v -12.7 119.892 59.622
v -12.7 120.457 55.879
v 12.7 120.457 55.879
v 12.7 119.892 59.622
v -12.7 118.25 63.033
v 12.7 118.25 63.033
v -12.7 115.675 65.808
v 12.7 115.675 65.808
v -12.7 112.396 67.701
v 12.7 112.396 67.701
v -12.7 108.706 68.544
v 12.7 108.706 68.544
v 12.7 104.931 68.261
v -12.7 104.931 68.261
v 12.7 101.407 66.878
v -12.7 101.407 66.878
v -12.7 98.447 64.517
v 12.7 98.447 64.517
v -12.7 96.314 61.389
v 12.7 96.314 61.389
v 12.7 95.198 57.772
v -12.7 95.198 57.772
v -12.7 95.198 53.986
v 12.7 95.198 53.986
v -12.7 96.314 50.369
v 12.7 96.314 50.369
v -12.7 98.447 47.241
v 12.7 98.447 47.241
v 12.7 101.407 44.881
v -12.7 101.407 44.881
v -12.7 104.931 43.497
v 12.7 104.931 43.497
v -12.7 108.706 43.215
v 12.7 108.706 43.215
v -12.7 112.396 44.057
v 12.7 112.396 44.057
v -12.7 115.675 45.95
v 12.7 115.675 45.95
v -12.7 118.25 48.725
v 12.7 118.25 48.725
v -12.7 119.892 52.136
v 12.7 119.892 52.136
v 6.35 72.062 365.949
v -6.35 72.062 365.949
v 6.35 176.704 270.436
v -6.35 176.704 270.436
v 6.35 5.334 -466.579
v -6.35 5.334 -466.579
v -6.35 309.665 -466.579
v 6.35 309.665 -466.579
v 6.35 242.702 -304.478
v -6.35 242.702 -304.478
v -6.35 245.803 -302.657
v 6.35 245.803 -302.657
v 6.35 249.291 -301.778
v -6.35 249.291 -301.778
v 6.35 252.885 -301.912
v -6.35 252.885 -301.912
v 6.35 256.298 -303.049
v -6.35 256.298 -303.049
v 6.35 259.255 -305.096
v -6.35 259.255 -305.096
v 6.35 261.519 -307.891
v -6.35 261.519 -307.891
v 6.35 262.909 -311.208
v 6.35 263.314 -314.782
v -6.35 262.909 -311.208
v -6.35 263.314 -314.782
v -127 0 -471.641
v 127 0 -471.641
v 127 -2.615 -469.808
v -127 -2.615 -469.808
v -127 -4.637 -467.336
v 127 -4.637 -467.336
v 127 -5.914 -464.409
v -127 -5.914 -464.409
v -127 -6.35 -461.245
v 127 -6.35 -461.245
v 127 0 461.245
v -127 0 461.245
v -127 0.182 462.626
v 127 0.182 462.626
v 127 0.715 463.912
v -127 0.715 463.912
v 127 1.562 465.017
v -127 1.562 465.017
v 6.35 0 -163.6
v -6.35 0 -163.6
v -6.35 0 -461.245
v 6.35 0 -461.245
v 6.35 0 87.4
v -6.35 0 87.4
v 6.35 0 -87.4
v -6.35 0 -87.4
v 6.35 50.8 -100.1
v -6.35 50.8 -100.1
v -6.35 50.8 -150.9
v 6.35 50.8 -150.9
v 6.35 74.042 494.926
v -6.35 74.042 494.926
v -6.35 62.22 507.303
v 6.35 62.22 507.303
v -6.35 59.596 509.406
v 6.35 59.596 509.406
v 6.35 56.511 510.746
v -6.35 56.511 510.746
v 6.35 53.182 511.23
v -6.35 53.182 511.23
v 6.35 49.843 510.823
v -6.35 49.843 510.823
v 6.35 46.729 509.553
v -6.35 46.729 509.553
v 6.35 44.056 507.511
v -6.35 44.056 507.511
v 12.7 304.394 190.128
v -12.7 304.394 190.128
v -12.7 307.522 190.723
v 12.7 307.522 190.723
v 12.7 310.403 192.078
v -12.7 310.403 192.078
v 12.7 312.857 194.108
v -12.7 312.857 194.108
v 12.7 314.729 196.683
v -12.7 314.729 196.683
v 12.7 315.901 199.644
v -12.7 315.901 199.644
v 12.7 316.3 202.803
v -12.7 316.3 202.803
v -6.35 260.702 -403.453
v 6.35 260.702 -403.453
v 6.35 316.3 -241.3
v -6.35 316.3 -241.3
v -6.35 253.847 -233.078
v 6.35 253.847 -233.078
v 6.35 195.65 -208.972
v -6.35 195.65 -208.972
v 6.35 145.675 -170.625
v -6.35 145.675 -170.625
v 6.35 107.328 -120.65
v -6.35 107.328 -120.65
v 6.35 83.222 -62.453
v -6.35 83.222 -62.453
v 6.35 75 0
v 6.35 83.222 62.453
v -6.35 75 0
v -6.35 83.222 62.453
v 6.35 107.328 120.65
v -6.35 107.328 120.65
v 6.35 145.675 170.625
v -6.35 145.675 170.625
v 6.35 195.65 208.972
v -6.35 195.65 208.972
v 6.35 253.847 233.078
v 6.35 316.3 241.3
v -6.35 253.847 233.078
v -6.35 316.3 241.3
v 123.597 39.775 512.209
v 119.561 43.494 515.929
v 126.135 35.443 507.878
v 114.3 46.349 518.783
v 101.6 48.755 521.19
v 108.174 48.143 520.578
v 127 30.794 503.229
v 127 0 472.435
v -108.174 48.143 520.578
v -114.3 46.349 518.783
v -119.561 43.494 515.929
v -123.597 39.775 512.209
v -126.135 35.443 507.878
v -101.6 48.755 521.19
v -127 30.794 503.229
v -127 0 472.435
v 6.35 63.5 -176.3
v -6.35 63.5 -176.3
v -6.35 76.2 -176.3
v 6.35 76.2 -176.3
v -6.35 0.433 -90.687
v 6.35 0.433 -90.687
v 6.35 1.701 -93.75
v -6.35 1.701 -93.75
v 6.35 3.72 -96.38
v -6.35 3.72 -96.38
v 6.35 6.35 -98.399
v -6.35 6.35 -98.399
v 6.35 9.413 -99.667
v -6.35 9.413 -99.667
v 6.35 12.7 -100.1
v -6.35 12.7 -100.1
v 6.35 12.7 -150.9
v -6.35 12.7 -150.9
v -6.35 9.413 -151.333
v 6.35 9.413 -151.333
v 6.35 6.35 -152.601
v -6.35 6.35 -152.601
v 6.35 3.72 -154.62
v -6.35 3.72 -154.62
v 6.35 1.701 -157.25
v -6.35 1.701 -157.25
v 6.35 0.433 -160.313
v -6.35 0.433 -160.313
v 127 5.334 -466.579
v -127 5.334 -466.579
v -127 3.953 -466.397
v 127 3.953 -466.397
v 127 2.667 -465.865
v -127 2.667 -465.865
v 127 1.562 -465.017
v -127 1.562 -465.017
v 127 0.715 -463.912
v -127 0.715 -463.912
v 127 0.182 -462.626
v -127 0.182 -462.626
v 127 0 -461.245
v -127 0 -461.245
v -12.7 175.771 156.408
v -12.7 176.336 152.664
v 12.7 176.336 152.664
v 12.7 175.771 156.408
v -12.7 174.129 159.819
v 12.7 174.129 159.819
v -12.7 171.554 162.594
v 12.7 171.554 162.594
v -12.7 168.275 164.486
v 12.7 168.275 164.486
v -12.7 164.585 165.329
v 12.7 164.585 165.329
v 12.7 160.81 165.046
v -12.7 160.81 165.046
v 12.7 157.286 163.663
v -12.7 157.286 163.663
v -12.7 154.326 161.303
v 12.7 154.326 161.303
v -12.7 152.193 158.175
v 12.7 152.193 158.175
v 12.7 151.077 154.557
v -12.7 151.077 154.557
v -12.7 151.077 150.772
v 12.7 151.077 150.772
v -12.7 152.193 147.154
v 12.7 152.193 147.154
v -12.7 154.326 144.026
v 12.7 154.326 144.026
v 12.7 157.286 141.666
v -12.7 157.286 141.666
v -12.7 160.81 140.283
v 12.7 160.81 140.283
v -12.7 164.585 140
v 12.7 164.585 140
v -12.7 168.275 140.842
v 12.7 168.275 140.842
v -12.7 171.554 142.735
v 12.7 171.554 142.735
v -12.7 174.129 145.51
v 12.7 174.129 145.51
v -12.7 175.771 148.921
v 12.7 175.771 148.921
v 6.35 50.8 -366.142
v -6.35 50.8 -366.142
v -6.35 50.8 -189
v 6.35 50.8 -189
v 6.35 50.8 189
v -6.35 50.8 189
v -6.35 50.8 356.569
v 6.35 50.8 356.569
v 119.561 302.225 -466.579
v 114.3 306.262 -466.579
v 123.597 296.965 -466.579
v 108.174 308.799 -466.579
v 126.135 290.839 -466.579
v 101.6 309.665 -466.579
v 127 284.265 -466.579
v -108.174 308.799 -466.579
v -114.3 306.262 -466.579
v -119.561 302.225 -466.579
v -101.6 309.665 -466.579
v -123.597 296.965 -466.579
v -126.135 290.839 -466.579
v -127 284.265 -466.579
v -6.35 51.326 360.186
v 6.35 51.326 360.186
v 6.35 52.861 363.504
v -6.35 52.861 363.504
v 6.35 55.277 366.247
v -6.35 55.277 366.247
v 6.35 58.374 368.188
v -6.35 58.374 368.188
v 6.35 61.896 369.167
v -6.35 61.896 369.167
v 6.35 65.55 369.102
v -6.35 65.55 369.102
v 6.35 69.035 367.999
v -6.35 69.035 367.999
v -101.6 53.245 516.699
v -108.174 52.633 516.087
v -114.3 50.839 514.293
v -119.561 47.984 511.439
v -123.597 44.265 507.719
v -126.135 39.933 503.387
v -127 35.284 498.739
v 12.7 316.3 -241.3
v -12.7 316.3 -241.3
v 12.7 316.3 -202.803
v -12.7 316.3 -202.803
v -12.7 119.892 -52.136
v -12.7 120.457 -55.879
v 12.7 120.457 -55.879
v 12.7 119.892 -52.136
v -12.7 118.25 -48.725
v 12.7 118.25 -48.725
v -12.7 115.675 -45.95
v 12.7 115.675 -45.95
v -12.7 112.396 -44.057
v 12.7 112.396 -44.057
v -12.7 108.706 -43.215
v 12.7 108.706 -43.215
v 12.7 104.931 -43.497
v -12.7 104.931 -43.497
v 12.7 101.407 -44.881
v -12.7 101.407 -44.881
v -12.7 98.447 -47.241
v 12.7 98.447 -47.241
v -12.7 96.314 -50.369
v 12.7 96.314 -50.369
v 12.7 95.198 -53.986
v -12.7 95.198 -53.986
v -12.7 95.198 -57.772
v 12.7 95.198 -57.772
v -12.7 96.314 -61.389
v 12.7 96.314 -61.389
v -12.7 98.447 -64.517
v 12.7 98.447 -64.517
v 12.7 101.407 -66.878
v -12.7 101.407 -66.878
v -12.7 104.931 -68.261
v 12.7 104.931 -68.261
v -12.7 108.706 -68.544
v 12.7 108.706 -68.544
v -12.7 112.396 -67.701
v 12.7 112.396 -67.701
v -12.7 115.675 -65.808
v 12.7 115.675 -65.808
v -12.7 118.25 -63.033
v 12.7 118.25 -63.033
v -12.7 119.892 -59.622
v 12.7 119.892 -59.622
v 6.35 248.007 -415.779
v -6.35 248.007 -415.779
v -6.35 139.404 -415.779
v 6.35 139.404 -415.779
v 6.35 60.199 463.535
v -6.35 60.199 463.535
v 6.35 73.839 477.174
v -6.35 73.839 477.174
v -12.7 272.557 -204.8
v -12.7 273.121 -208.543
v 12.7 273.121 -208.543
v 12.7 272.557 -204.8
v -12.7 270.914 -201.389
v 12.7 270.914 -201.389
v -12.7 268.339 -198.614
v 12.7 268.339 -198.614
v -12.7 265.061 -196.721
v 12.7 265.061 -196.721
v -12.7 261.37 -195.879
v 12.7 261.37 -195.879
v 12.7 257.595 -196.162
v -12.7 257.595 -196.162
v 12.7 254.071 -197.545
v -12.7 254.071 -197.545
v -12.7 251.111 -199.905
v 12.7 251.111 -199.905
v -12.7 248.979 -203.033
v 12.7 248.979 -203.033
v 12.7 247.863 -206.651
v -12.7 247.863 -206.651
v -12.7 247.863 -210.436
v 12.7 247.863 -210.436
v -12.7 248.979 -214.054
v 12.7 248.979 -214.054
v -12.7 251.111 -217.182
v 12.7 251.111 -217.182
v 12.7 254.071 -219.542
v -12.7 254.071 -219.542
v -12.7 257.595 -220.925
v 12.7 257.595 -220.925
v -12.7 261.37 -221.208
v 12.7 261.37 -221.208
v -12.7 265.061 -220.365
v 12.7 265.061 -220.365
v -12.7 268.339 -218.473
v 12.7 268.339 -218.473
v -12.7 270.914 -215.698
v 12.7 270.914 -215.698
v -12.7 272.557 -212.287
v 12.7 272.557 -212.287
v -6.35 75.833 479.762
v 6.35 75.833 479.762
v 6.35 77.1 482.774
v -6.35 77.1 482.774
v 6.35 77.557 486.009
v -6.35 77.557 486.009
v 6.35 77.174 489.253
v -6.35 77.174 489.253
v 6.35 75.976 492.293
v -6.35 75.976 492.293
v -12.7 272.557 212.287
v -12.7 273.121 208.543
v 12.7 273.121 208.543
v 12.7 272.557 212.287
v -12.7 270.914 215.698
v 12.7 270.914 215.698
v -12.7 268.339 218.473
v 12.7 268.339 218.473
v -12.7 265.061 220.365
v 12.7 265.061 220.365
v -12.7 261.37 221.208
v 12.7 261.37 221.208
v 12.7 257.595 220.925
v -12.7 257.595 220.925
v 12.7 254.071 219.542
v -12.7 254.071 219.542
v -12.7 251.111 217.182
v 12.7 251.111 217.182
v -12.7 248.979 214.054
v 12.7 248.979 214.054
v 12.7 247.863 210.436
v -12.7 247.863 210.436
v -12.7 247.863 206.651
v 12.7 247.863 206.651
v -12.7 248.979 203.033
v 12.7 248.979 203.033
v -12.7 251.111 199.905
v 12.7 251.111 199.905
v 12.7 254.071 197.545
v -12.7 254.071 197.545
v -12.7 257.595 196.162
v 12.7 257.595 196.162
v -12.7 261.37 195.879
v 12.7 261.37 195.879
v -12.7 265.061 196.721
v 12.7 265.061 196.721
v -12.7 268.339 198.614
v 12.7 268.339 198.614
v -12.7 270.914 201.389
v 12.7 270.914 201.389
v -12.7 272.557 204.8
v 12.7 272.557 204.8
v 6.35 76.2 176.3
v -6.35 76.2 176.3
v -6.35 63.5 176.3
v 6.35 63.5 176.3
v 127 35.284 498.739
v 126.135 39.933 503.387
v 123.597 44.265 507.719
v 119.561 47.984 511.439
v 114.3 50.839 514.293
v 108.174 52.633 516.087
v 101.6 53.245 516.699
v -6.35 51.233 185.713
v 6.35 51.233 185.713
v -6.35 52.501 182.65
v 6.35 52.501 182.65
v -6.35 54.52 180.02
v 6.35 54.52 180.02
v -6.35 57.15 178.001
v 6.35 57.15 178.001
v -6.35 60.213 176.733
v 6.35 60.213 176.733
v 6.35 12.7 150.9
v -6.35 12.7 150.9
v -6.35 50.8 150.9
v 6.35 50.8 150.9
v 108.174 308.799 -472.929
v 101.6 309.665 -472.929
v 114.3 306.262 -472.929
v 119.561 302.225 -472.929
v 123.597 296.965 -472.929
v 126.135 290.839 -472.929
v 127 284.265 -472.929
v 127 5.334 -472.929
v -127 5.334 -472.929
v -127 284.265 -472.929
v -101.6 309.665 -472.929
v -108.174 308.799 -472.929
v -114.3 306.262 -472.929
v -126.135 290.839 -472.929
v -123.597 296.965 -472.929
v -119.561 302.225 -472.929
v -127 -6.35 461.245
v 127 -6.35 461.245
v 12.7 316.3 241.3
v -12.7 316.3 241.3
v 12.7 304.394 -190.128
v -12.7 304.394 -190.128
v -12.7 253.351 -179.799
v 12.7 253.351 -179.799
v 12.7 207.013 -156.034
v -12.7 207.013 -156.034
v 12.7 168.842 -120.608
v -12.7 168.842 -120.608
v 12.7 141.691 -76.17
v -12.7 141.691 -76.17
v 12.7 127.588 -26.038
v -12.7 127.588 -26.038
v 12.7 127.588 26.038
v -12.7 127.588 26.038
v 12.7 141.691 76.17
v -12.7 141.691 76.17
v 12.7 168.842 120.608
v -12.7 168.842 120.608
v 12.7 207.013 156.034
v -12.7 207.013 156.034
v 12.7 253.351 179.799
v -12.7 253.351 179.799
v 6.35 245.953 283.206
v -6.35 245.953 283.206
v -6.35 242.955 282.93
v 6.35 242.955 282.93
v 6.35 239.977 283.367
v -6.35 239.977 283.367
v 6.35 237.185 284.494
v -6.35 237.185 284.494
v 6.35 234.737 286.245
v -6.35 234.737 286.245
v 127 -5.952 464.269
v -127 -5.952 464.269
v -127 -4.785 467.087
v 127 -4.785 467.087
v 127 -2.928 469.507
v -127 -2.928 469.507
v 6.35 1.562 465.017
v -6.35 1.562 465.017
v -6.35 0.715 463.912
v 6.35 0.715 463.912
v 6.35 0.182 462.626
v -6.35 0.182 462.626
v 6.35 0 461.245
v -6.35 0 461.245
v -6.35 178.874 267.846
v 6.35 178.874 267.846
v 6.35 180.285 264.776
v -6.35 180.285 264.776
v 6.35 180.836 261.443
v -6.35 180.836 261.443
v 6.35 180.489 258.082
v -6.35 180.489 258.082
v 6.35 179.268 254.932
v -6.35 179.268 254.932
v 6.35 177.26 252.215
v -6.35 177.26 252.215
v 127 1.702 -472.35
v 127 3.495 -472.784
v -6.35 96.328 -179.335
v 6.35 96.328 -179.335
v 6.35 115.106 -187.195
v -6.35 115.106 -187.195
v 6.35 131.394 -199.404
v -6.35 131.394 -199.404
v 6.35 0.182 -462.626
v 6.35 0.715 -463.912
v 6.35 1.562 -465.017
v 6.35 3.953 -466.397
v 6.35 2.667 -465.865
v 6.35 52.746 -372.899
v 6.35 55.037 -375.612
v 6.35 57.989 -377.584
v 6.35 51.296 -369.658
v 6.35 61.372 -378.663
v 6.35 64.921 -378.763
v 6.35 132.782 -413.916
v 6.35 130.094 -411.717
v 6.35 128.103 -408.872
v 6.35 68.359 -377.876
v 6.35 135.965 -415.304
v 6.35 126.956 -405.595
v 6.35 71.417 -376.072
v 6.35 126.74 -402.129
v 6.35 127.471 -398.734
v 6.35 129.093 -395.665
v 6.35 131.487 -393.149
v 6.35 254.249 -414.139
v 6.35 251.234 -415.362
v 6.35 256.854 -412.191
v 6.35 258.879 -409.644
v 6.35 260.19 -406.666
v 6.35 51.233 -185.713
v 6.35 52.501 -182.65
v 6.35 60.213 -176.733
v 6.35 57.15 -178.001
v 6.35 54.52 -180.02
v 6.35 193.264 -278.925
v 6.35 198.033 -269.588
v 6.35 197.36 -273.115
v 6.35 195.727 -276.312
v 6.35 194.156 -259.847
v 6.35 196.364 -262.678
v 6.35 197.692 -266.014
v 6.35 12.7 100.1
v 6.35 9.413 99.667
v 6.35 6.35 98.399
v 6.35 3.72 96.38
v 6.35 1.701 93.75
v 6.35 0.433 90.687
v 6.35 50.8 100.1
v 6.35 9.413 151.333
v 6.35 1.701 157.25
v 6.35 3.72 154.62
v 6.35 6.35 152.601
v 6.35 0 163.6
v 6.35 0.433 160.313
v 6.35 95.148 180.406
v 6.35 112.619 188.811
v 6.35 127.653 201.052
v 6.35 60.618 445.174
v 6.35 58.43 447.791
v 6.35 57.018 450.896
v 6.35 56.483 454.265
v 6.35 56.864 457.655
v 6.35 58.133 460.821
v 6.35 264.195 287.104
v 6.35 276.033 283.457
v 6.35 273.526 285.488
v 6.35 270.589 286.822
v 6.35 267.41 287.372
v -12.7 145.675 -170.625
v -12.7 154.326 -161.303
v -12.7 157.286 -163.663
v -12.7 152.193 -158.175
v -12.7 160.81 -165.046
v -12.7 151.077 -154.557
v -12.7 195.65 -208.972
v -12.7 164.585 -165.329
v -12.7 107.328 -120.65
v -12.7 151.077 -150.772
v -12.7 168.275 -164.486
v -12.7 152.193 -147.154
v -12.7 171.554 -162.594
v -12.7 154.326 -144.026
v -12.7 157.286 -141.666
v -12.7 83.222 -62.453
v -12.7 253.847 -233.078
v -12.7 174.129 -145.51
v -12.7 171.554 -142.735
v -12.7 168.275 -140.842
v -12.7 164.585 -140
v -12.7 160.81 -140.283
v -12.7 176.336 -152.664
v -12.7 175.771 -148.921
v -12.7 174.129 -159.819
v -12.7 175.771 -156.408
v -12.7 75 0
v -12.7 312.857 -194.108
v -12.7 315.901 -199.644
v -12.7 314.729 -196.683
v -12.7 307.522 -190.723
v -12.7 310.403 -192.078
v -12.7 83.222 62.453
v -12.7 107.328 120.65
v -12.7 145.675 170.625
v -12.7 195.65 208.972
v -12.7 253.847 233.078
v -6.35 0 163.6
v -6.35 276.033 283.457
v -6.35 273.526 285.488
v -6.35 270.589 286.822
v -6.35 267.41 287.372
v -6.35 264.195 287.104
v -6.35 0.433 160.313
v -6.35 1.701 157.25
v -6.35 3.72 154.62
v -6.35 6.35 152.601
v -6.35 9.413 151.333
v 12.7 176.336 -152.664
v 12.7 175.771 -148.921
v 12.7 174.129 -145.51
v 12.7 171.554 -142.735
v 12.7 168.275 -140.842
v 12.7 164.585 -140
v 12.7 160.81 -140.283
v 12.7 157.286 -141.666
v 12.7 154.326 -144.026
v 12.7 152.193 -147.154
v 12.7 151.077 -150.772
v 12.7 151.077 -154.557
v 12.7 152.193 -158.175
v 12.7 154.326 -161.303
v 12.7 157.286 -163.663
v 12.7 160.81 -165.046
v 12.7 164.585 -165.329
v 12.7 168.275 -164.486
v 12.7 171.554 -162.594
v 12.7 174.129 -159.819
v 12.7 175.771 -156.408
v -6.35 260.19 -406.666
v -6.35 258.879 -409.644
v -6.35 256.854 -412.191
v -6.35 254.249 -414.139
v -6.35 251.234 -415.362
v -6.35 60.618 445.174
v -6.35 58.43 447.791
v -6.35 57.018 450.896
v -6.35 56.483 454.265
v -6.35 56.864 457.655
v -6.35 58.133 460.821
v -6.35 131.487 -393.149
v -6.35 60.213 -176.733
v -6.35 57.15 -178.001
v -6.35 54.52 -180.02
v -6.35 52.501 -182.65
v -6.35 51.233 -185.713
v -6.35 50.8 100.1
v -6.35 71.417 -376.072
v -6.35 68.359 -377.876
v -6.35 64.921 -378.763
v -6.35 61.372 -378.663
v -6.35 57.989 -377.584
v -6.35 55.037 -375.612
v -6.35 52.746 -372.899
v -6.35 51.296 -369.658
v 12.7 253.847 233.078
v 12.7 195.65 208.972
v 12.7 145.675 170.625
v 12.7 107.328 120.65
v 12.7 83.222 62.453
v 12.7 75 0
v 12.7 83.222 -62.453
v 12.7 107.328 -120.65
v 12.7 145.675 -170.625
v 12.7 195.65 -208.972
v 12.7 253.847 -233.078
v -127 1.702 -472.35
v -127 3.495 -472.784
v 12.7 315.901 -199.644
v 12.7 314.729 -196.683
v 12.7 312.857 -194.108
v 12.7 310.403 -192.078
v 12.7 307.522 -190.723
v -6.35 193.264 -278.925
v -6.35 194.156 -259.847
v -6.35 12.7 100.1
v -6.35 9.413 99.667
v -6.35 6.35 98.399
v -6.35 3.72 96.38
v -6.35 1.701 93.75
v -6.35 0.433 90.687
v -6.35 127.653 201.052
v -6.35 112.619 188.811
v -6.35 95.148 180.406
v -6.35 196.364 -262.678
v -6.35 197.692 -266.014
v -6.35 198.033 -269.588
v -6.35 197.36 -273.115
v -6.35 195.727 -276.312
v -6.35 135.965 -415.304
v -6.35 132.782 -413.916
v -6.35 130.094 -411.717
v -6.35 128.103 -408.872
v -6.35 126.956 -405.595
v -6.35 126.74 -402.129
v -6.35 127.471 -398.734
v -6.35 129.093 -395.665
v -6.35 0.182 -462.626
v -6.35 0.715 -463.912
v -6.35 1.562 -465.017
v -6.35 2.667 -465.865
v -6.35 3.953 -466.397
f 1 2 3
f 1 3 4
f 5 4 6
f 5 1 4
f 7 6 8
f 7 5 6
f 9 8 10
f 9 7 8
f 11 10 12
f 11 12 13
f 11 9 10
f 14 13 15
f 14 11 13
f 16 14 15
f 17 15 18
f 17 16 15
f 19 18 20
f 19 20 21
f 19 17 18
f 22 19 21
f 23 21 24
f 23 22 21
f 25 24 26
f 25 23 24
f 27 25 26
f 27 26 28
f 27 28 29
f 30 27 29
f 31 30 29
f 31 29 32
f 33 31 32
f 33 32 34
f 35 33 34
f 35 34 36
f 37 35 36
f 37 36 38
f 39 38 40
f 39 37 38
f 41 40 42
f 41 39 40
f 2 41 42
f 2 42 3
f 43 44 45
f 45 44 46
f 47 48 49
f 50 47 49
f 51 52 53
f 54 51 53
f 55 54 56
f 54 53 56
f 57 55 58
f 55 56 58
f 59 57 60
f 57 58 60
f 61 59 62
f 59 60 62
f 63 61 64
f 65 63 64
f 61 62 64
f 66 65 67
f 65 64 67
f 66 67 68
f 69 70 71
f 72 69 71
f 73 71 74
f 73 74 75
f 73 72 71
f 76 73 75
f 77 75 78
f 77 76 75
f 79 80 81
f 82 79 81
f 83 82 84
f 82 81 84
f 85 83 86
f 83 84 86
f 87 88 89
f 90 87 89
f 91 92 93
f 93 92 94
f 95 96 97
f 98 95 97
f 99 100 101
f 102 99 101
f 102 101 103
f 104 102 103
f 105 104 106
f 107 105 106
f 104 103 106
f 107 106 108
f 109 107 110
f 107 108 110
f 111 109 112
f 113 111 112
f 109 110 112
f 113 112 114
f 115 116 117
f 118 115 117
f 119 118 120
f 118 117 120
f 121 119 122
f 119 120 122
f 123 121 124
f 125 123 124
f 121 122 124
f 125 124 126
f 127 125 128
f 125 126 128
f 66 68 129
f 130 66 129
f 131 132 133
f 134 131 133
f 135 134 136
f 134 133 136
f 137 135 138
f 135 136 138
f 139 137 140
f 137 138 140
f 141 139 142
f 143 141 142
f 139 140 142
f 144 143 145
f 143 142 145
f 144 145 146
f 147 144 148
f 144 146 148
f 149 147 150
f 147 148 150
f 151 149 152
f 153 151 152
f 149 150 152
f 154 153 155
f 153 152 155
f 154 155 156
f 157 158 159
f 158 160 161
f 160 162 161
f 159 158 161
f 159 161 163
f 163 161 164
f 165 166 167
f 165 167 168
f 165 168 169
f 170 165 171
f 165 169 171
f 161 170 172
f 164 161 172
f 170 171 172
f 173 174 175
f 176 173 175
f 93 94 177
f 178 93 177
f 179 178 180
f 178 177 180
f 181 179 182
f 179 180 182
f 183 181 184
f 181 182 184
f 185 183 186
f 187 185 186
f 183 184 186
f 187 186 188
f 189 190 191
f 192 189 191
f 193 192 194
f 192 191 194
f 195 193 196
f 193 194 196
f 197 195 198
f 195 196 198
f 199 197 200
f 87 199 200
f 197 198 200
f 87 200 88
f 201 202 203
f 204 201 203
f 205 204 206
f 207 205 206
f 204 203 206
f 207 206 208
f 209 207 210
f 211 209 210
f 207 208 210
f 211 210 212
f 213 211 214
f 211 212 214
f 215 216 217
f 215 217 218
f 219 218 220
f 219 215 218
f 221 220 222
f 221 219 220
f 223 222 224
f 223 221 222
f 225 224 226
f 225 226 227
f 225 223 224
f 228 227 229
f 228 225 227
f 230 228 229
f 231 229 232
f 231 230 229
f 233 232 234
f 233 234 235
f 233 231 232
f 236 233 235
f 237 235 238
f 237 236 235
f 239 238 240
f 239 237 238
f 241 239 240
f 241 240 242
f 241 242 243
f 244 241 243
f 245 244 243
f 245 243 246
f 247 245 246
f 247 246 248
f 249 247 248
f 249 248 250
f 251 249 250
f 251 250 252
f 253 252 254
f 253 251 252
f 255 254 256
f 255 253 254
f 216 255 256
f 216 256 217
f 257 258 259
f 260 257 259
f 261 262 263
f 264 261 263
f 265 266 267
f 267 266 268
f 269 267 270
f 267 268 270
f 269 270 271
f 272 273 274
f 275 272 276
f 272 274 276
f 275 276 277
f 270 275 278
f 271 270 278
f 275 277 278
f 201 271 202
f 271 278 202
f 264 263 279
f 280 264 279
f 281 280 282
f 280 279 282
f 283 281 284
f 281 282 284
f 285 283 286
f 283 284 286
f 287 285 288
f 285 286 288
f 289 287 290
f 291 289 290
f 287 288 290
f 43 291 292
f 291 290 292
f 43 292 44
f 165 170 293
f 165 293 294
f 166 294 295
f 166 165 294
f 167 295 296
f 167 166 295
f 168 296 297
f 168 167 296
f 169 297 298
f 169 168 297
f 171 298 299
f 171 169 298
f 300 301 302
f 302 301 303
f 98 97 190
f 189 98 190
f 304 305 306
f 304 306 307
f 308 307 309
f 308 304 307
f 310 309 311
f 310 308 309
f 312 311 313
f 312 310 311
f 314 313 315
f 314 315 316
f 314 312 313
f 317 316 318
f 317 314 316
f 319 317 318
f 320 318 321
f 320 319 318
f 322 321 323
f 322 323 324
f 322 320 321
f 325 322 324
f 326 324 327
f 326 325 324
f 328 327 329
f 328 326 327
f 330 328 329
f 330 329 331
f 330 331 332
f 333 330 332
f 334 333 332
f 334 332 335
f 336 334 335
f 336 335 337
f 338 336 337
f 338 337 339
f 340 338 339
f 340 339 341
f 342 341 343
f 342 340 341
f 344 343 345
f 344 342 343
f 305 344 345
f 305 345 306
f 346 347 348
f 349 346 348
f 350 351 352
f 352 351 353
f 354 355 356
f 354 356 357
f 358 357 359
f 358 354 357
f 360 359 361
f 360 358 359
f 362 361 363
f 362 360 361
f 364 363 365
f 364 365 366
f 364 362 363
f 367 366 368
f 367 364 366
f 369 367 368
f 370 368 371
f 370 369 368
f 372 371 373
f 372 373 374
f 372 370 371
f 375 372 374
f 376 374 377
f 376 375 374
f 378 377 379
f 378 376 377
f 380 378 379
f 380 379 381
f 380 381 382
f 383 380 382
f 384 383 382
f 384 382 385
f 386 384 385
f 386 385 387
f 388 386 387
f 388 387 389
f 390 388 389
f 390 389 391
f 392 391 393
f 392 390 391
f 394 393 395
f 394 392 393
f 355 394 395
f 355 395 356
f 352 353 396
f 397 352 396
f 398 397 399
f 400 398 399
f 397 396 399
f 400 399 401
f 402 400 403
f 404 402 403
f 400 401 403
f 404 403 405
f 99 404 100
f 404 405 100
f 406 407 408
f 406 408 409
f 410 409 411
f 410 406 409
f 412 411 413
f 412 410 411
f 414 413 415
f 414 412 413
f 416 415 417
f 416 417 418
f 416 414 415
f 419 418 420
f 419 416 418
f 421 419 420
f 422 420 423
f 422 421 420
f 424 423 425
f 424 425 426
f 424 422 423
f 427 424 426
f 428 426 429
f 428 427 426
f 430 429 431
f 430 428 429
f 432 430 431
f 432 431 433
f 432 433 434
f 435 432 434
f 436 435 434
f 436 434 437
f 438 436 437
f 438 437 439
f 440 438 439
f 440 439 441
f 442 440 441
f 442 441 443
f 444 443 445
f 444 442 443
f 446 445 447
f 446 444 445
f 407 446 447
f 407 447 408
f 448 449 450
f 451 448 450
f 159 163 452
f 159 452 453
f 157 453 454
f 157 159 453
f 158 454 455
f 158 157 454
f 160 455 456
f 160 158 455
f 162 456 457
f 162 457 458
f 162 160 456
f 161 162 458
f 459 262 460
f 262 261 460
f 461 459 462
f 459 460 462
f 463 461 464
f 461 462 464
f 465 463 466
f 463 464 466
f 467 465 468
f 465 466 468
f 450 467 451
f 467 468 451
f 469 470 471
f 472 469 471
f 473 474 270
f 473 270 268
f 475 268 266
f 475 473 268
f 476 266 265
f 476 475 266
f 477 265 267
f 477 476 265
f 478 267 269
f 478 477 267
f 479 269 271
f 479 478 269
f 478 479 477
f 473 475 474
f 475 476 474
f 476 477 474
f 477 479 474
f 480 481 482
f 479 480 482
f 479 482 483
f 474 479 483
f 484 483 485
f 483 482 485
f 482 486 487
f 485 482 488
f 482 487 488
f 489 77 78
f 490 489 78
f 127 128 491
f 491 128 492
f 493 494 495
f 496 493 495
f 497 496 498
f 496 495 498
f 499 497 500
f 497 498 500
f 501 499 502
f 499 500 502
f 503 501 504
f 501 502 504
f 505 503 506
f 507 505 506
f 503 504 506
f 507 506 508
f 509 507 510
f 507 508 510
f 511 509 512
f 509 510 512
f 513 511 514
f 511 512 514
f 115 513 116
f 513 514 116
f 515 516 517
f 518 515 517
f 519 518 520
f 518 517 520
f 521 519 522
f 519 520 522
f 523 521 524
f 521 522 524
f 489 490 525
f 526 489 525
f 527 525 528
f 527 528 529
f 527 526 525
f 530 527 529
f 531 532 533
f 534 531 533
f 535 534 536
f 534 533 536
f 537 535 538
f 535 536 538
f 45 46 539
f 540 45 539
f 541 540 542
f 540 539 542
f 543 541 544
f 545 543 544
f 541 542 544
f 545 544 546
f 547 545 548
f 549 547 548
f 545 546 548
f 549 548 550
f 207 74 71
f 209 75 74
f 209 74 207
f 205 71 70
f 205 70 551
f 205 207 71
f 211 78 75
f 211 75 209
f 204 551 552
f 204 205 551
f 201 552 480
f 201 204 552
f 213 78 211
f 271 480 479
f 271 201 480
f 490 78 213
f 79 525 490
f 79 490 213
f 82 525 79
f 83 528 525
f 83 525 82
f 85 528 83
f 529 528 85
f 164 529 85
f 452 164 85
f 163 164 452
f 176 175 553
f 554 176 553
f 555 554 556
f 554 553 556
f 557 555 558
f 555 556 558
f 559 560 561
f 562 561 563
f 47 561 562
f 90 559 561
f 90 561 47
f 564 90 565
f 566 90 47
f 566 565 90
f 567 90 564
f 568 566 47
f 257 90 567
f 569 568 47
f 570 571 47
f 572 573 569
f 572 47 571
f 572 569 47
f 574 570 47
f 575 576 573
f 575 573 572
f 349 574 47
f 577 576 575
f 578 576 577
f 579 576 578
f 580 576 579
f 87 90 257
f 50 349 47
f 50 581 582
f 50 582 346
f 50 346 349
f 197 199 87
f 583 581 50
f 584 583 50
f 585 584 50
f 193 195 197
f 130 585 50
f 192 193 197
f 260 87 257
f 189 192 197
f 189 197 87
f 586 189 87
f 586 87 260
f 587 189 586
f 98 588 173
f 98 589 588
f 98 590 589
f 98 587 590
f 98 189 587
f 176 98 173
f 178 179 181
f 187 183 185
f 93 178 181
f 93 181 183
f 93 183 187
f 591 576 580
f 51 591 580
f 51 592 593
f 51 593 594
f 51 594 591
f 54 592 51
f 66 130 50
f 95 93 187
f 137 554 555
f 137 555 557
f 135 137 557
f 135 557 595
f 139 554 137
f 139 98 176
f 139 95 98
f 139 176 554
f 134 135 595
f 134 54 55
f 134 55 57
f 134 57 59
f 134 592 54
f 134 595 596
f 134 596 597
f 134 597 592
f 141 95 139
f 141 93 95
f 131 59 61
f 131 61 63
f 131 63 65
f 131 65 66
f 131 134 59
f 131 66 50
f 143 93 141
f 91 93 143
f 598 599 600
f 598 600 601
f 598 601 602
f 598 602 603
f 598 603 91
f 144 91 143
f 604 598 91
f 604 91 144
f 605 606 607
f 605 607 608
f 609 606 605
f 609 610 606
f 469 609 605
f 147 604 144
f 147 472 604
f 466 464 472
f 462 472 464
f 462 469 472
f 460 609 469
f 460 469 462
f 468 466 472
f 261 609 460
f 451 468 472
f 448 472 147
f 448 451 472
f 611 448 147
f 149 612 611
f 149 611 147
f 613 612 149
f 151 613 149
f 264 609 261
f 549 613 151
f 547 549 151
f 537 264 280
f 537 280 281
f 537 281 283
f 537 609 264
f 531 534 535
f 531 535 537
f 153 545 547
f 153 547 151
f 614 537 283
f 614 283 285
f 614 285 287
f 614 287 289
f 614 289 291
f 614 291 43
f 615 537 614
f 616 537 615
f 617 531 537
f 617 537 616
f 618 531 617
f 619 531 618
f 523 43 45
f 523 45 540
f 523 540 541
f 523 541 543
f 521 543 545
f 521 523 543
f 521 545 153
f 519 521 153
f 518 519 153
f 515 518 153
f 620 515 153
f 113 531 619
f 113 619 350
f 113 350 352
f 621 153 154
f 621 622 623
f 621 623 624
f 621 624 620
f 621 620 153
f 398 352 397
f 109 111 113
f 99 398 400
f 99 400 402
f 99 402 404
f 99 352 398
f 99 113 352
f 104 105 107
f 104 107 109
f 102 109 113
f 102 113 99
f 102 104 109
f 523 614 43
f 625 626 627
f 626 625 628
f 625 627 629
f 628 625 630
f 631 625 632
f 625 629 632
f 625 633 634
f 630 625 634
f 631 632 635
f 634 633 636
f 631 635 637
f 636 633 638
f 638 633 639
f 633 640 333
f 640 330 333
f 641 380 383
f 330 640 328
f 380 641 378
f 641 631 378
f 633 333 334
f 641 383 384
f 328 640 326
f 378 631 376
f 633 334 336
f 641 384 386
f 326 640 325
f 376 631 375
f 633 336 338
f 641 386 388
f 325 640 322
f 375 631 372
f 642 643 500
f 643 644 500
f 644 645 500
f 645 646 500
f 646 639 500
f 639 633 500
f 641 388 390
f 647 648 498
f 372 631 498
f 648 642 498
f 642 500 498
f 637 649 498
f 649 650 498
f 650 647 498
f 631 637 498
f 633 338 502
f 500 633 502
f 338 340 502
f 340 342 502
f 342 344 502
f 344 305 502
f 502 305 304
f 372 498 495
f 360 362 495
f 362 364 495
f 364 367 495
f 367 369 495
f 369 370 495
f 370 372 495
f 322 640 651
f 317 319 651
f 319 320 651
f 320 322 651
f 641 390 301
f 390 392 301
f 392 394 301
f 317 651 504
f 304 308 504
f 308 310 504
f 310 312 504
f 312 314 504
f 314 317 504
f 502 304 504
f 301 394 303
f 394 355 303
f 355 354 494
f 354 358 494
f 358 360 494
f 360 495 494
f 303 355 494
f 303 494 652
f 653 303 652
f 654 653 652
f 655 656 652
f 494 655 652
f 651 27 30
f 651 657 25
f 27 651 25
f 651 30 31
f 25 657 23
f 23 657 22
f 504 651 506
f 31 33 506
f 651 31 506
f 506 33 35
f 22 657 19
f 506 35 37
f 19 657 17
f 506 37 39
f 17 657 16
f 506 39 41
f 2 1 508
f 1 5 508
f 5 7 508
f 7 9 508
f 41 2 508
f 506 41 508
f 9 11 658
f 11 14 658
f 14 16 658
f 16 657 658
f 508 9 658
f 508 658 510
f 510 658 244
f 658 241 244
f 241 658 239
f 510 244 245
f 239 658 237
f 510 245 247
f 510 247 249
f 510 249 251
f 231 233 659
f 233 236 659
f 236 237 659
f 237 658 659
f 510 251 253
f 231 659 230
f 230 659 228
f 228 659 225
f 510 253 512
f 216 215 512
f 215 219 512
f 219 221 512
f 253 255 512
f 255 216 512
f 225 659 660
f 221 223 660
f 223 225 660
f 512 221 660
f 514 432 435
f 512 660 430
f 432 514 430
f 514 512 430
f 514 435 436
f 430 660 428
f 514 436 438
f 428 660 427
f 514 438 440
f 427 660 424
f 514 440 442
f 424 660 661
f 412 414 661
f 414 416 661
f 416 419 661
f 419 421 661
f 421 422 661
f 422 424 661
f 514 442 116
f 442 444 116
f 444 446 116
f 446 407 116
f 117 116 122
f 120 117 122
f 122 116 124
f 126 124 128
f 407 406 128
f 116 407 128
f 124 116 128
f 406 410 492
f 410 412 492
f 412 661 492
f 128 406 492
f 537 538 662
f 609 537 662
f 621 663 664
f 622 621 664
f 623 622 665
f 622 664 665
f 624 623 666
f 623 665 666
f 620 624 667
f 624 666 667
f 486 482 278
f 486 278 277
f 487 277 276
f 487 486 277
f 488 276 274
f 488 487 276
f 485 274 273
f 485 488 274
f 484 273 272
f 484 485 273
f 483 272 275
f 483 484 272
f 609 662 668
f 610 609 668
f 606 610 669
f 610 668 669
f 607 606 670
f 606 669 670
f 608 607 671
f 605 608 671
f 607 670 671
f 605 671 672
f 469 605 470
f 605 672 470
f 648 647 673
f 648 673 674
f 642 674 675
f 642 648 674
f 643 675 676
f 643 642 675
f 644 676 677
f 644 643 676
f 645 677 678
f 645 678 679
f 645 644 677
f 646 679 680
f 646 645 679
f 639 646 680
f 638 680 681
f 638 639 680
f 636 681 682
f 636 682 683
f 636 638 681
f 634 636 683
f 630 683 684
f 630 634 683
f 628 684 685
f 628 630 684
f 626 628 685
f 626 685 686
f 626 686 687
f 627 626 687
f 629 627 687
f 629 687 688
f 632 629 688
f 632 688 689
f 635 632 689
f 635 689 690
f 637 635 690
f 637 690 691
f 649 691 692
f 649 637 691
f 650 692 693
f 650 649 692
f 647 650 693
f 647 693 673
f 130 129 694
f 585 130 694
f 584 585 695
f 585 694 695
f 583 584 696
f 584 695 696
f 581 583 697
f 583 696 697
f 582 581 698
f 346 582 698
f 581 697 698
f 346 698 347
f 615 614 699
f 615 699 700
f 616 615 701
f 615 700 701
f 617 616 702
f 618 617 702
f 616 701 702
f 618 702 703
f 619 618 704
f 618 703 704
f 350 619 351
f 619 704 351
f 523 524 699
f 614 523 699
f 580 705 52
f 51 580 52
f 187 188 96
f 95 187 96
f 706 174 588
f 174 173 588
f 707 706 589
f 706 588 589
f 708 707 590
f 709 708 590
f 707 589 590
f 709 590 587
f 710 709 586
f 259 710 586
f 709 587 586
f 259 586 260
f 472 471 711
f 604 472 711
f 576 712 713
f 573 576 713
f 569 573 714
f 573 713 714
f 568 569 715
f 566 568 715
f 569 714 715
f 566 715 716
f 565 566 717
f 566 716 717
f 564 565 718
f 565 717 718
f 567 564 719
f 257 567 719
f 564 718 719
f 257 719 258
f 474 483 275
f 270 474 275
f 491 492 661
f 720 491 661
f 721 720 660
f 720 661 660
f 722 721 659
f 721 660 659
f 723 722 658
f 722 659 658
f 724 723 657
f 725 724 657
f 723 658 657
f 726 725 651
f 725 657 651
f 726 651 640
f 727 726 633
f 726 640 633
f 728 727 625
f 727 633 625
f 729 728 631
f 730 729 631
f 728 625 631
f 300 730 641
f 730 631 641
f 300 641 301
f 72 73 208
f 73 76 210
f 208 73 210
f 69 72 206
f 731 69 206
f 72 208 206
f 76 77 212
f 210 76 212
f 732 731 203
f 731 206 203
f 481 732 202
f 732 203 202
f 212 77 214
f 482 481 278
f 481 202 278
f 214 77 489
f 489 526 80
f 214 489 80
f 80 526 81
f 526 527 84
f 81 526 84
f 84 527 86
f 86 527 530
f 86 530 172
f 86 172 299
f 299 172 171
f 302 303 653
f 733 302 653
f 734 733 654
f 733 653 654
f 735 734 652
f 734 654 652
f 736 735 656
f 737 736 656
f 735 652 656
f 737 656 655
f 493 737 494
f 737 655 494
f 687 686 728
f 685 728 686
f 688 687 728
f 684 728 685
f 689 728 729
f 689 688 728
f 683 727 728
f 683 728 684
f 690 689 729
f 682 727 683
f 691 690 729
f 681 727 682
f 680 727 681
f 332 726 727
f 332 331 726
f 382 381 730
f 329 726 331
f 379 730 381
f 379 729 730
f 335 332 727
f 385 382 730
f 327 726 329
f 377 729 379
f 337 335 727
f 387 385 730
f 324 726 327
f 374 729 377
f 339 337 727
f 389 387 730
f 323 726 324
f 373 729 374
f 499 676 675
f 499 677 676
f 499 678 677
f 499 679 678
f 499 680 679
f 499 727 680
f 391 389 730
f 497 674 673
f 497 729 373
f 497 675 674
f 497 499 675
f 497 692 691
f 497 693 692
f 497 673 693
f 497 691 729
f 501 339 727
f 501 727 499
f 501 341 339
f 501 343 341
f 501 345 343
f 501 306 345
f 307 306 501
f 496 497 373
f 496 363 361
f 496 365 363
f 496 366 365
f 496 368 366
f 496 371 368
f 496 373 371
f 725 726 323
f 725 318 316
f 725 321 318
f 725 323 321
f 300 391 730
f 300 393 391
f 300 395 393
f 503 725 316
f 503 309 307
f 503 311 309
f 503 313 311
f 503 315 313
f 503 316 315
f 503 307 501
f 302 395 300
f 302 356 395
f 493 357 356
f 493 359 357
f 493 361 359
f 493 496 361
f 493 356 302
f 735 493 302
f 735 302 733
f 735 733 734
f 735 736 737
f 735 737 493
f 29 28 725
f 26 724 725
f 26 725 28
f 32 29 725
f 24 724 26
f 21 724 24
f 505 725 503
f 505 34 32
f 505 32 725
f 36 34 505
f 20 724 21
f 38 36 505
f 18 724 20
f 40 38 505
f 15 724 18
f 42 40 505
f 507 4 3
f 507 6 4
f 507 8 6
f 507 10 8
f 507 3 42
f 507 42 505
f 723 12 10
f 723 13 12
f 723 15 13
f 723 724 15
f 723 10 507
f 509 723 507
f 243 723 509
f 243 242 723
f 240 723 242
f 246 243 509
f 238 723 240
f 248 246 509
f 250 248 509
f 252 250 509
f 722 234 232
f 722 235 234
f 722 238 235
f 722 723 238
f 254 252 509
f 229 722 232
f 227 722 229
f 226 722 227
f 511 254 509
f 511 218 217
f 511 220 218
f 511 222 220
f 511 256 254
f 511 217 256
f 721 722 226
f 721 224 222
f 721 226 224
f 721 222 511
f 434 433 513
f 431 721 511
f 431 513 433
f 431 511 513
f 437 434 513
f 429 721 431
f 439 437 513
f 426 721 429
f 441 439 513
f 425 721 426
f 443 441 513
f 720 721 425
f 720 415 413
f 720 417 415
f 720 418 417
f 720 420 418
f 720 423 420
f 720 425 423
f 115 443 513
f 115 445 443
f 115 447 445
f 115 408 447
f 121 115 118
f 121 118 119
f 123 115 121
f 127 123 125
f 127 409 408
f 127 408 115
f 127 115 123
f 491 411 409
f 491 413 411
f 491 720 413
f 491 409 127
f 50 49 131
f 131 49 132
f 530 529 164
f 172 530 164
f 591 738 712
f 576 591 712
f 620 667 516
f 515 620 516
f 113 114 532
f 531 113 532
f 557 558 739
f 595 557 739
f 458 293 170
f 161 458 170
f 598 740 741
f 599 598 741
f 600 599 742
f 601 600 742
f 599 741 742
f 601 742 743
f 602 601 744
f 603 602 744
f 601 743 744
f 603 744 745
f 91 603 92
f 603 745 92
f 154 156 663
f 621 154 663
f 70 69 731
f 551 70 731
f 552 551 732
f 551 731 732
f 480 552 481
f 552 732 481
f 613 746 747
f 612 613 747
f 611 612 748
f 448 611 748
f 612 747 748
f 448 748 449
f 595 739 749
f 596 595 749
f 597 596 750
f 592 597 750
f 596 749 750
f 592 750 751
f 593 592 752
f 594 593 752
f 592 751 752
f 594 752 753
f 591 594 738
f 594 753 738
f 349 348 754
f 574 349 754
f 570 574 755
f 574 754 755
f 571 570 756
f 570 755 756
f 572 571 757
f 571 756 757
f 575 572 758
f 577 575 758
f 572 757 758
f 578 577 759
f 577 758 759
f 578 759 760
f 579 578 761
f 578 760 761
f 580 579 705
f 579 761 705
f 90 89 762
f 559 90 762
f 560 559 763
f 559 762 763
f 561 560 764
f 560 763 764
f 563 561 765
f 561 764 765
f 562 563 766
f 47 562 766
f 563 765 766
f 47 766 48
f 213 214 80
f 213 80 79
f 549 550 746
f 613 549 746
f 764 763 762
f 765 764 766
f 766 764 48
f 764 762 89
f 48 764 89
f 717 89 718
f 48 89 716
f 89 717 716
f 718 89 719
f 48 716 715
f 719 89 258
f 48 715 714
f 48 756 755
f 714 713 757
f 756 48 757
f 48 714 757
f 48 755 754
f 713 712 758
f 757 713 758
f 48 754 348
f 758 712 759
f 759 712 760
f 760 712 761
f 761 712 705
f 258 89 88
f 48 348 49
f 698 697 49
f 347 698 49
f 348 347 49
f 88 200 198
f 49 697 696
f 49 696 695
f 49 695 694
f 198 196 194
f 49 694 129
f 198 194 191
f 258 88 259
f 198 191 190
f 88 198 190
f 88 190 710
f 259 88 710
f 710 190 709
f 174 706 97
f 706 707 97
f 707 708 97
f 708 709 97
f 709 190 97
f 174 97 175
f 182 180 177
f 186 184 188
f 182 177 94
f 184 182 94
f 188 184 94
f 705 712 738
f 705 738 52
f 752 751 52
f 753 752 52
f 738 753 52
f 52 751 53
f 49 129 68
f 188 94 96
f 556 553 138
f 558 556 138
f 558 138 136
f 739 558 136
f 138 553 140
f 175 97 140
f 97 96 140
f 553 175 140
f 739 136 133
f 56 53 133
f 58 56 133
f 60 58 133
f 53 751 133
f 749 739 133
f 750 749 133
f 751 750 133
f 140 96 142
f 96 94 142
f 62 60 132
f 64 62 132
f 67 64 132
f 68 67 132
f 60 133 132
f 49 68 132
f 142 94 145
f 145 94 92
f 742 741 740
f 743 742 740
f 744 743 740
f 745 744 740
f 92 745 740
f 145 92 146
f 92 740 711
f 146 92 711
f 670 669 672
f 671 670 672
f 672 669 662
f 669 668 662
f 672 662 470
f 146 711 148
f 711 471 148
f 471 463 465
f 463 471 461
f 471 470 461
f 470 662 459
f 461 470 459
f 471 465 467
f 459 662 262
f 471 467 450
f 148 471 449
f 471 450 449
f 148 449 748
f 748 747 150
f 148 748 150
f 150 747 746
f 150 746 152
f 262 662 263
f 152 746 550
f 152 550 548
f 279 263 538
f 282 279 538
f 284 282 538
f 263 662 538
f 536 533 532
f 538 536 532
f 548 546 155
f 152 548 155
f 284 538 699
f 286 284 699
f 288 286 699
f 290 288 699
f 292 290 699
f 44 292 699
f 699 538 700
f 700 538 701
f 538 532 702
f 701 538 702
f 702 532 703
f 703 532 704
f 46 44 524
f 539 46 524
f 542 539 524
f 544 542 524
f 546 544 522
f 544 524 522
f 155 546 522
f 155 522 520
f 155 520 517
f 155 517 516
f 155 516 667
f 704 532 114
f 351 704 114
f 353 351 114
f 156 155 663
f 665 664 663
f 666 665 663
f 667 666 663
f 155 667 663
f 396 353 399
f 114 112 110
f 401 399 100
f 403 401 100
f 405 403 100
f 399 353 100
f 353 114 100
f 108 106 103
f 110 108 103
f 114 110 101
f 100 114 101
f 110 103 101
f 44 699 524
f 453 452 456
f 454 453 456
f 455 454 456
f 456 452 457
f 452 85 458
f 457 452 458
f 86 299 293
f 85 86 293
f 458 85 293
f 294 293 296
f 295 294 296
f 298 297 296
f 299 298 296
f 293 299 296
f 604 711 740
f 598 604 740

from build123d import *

# Parameters (mm, degrees)
FLANGE_PROFILE_DEPTH              = 12.7
F_7_8_1_DIAMETER_HOLE1_D          = 25.4
BOLT_PATTERN_COUNT                = 12
SKETCH5_W                         = 254
SKETCH5_H                         = 1317.865260112
BASE_SKID_DEPTH                   = 6.35
BEND_START                        = -127
BEND_HEEL_DEPTH                   = 254
BEND_HEEL_2_DEPTH                 = 254
BEND_TOE_DEPTH                    = 254
BEND_TOE_2_DEPTH                  = 254
WEBBING_BODY_DEPTH                = 6.35
WEBBING_HOLES_DEPTH               = 623.746559258
WEBBING_HOLES_DEPTH_BACK          = 623.746559258
CROSSBEAM_DEPTH                   = 623.746559258
CROSSBEAM_DEPTH_BACK              = 623.746559258
CROSSMEMBER_W                     = 50.8
CROSSMEMBER_H                     = 50.8
CROSSBEAM_CLEARANCE_DEPTH         = 6.35
CROSSBEAM_FILLET_R                = 12.7
FILLET_CLEARANCE_R                = 82.7
WEBBING_FILLET_R                  = 12.7
SKID_START                        = -474
SKID_EDGES_DEPTH                  = 8
SKID_START_2                      = -335
SKID_EDGES_2_DEPTH                = 8
FLANGE_FILLET_R                   = 12.7
CONVERT_START                     = -12.7
CONVERT_FLANGE_TO_SHEET_OUTLINE_R = 12.7
CONVERT_FLANGE_TO_SHEET_DEPTH     = 25.4
CONVERT_START_2                   = -6.35
CONVERT_WEBBING_TO_SHEET_DEPTH    = 12.7
FILLET2_R                         = 12.7


with BuildPart() as part:
    # Sketch1 → Flange Profile (new, symmetric)
    with BuildSketch(Plane(origin=(0, 0, 0), x_dir=(0, 0, -1), z_dir=(1, 0, 0))):
        with BuildLine():
            Line((241.3, 316.3), (190.5, 316.3))
            ThreePointArc((190.5, 316.3), (0, 125.8), (-190.5, 316.3))
            Line((-190.5, 316.3), (-241.3, 316.3))
            ThreePointArc((-241.3, 316.3), (0, 75), (241.3, 316.3))
        make_face()
    extrude(amount=FLANGE_PROFILE_DEPTH, both=True)

    # 7/8 (1) Diameter Hole1 (through all)
    with Locations(Plane(origin=(12.7, 260.420968162, -208.543385896), x_dir=(0, 0, 1), z_dir=(1, 0, 0))):
        with Locations((0, 0)):
            f_7_8_1_diameter_hole1 = Hole(F_7_8_1_DIAMETER_HOLE1_D / 2)

    # Bolt Pattern: 7/8 (1) Diameter Hole1 ×12 about axis
    bolt_pattern_axis = Axis((0, 316.3, 0), (1, 0, 0))
    for i in range(1, BOLT_PATTERN_COUNT):
        add(f_7_8_1_diameter_hole1.rotate(bolt_pattern_axis, i * 360 / BOLT_PATTERN_COUNT), mode=Mode.SUBTRACT)

    # Flange Fillet
    flange_fillet_edges = [part.edges().sort_by_distance(p)[0] for p in [
        (0, 316.3, 190.5),
        (0, 316.3, -190.5),
    ]]
    fillet(flange_fillet_edges, radius=FLANGE_FILLET_R)


with BuildPart() as body_2:
    # Base Skid: sheet metal written as solids
    # Sketch5 → Base Skid (new body)
    with BuildSketch(Plane(origin=(0, 0, 0), x_dir=(1, 0, 0), z_dir=(0, 1, 0))):
        with Locations((0, 118.6125)):
            Rectangle(SKETCH5_W, SKETCH5_H)
    extrude(amount=-BASE_SKID_DEPTH)

    # Bend Heel: read off the stored shape, not the designer's step
    # Bend Heel outline → Bend Heel (cut)
    with BuildSketch(Plane.YZ.offset(BEND_START)):
        with BuildLine():
            Line((0, -777.545130056), (0, -471.640528076))
            ThreePointArc((0, -471.640528076), (-4.636915504, -467.33583609), (-6.35, -461.245130056))
            Line((-6.35, -461.245130056), (-6.35, -777.545130056))
            Line((-6.35, -777.545130056), (0, -777.545130056))
        make_face()
    extrude(amount=BEND_HEEL_DEPTH, mode=Mode.SUBTRACT)

    # Bend Heel 2 outline → Bend Heel 2 (add)
    with BuildSketch(Plane.YZ.offset(BEND_START)):
        with BuildLine():
            Line((5.334, -472.929130056), (309.66453199, -472.929130056))
            Line((309.66453199, -472.929130056), (309.66453199, -466.579130056))
            Line((309.66453199, -466.579130056), (5.334, -466.579130056))
            ThreePointArc((5.334, -466.579130056), (1.56229243, -465.016837626), (0, -461.245130056))
            Line((0, -461.245130056), (0, -471.640528076))
            ThreePointArc((0, -471.640528076), (2.590277571, -472.602411563), (5.334, -472.929130056))
        make_face()
    extrude(amount=BEND_HEEL_2_DEPTH)

    # Bend Toe: read off the stored shape, not the designer's step
    # Bend Toe outline → Bend Toe (cut)
    with BuildSketch(Plane.YZ.offset(BEND_START)):
        with BuildLine():
            Line((-6.35, 540.320130056), (-6.35, 461.245130056))
            ThreePointArc((-6.35, 461.245130056), (-5.460608458, 465.71640328), (-2.927835631, 469.506965687))
            Line((-2.927835631, 469.506965687), (0, 472.434801318))
            Line((0, 472.434801318), (0, 540.320130056))
            Line((0, 540.320130056), (-6.35, 540.320130056))
        make_face()
    extrude(amount=BEND_TOE_DEPTH, mode=Mode.SUBTRACT)

    # Bend Toe 2 outline → Bend Toe 2 (add)
    with BuildSketch(Plane.YZ.offset(BEND_START)):
        with BuildLine():
            Line((48.754787092, 521.189588411), (0, 472.434801318))
            Line((0, 472.434801318), (0, 461.245130056))
            ThreePointArc((0, 461.245130056), (0.406026574, 463.286363484), (1.562292429, 465.016837626))
            Line((1.562292429, 465.016837626), (53.244915153, 516.69946035))
            Line((53.244915153, 516.69946035), (48.754787092, 521.189588411))
        make_face()
    extrude(amount=BEND_TOE_2_DEPTH)

    # Skid Edges: read off the stored shape, not the designer's step
    # Skid Edges outline → Skid Edges (cut)
    with BuildSketch(Plane.XY.offset(SKID_START)):
        with BuildLine():
            ThreePointArc((-127, 284.26453199), (-119.560512242, 302.225044232), (-101.6, 309.66453199))
            Line((-101.6, 309.66453199), (-127, 309.66453199))
            Line((-127, 309.66453199), (-127, 284.26453199))
        make_face()
        with BuildLine():
            ThreePointArc((101.6, 309.66453199), (119.560512242, 302.225044232), (127, 284.26453199))
            Line((127, 284.26453199), (127, 309.66453199))
            Line((127, 309.66453199), (101.6, 309.66453199))
        make_face()
    extrude(amount=SKID_EDGES_DEPTH, mode=Mode.SUBTRACT)

    # Skid Edges 2 outline → Skid Edges 2 (cut)
    with BuildSketch(Plane(origin=(0, 0, 0), x_dir=(1, 0, 0), z_dir=(0, 0.707106781186546, -0.707106781186549)).offset(SKID_START_2)):
        with BuildLine():
            Line((-127, -403.011532817), (-101.6, -403.011532817))
            ThreePointArc((-101.6, -403.011532817), (-119.560512242, -395.572045059), (-127, -377.611532817))
            Line((-127, -377.611532817), (-127, -403.011532817))
        make_face()
        with BuildLine():
            ThreePointArc((127, -377.611532817), (119.560512242, -395.572045059), (101.6, -403.011532817))
            Line((101.6, -403.011532817), (127, -403.011532817))
            Line((127, -403.011532817), (127, -377.611532817))
        make_face()
    extrude(amount=SKID_EDGES_2_DEPTH, mode=Mode.SUBTRACT)


with BuildPart() as body_3:
    # Sketch12 → Webbing Body (new, symmetric)
    with BuildSketch(Plane(origin=(0, 0, 0), x_dir=(0, 0, -1), z_dir=(1, 0, 0))):
        with BuildLine():
            Line((-516.69946035, 53.244915153), (-465.016837626, 1.562292429))
            ThreePointArc((-465.016837626, 1.562292429), (-463.286363484, 0.406026574), (-461.245130056, 0))
            Line((-461.245130056, 0), (461.245130056, 0))
            ThreePointArc((461.245130056, 0), (465.016837626, 1.562292429), (466.579130056, 5.334))
            Line((466.579130056, 5.334), (466.579130056, 309.66453199))
            Line((466.579130056, 309.66453199), (241.3, 316.3))
            ThreePointArc((241.3, 316.3), (0, 75), (-241.3, 316.3))
            Line((-241.3, 316.3), (-516.69946035, 53.244915153))
        make_face()
    extrude(amount=WEBBING_BODY_DEPTH, both=True)

    # Sketch13 → Webbing Holes (cut, two sides: drawn at the far end of the back side and taken through both)
    with BuildSketch(Plane(origin=(0, 0, 0), x_dir=(0, 0, -1), z_dir=(1, 0, 0)).offset(-WEBBING_HOLES_DEPTH_BACK)):
        Polygon((415.779130056, 260.338785622), (287.40157486, 264.120073132), (415.779130056, 103.103449381), align=None)
        Polygon((-121.787355666, 50.8), (-385.355758001, 50.8), (-261.612051176, 186.371001392), align=None)
        Polygon((269.894826504, 204.589693285), (392.510394874, 50.8), (121.787355666, 50.8), align=None)
        Polygon((-454.135463722, 50.8), (-485.950787611, 82.615323889), (-288.586784033, 271.132776469), (-281.840137894, 239.563133553), align=None)
    extrude(amount=WEBBING_HOLES_DEPTH + WEBBING_HOLES_DEPTH_BACK, mode=Mode.SUBTRACT)

    # crossmember → Crossbeam (cut, two sides: drawn at the far end of the back side and taken through both)
    with BuildSketch(Plane(origin=(0, 0, 0), x_dir=(0, 0, -1), z_dir=(1, 0, 0)).offset(-CROSSBEAM_DEPTH_BACK)):
        with Locations((125.5, 25.4)):
            Rectangle(CROSSMEMBER_W, CROSSMEMBER_H)
        with Locations((-125.5, 25.4)):
            Rectangle(CROSSMEMBER_W, CROSSMEMBER_H)
    extrude(amount=CROSSBEAM_DEPTH + CROSSBEAM_DEPTH_BACK, mode=Mode.SUBTRACT)

    # crossmember<5> → Crossbeam Clearance (add, symmetric)
    with BuildSketch(Plane(origin=(0, 0, 0), x_dir=(0, 0, -1), z_dir=(1, 0, 0))):
        Polygon((100.1, 50.8), (150.9, 50.8), (150.9, 0), (176.3, 0), (176.3, 76.2), (74.7, 76.2), (74.7, 0), (100.1, 0), align=None)
        Polygon((-100.1, 0), (-74.7, 0), (-74.7, 76.2), (-176.3, 76.2), (-176.3, 0), (-150.9, 0), (-150.9, 50.8), (-100.1, 50.8), align=None)
    extrude(amount=CROSSBEAM_CLEARANCE_DEPTH, both=True)

    # Crossbeam fillet
    crossbeam_fillet_edges = [body_3.edges().sort_by_distance(p)[0] for p in [
        (0, 0, -150.9),
        (0, 0, -100.1),
        (0, 0, 100.1),
        (0, 0, 150.9),
    ]]
    fillet(crossbeam_fillet_edges, radius=CROSSBEAM_FILLET_R)

    # Fillet Clearance
    # the kernel refuses this fillet: 82.7 mm, written as the material it adds along each edge
    with BuildSketch(Plane(origin=(6.35, 76.2, -146.248876324), x_dir=(0, 0, -1), z_dir=(-1, 0, 0))) as fillet_clearance_piece_1:
        with BuildLine():
            CenterArc((112.722573697, 2.172867127), FILLET_CLEARANCE_R, 181.505567644, 42.416154829)
            Line((53.154741922, -55.194052066), (0, 0))
            Line((0, 0), (30.051123676, 0))
        make_face()
    extrude(amount=12.7)
    with BuildSketch(Plane(origin=(-6.35, 76.2, 147.984309509), x_dir=(0, 0.6961019539421004, 0.7179429432190206), z_dir=(1, 0, 0))) as fillet_clearance_piece_2:
        with BuildLine():
            CenterArc((73.916608705, 82.7), FILLET_CLEARANCE_R, 229.610877342, 40.389122658)
            Line((20.32905017, 19.710607478), (0, 0))
            Line((0, 0), (73.916608705, 0))
        make_face()
    extrude(amount=12.7)

    # Webbing Fillet
    webbing_fillet_edges = [body_3.edges().sort_by_distance(p)[0] for p in [
        (0, 53.244915153, 516.69946035),
        (0, 82.615323889, 485.950787611),
        (0, 271.132776469, 288.586784033),
        (0, 239.563133553, 281.840137894),
        (0, 50.8, 454.135463722),
        (0, 204.589693285, -269.894826504),
        (0, 50.8, -392.510394874),
        (0, 186.371001392, 261.612051176),
        (0, 50.8, 385.355758001),
        (0, 260.338785622, -415.779130056),
        (0, 103.103449381, -415.779130056),
        (0, 264.120073132, -287.40157486),
    ]]
    fillet(webbing_fillet_edges, radius=WEBBING_FILLET_R)


with BuildPart() as body_4:
    # Convert Flange to Sheet: read off the stored shape, not the designer's step
    # Convert Flange to Sheet outline → Convert Flange to Sheet (new body)
    with BuildSketch(Plane.YZ.offset(CONVERT_START)):
        with BuildLine():
            ThreePointArc((304.39375, 190.127565626), (312.856636133, 194.107641068), (316.3, 202.802736668))
            Line((316.3, 202.802736668), (316.3, 241.3))
            ThreePointArc((316.3, 241.3), (75, 0), (316.3, -241.3))
            Line((316.3, -241.3), (316.3, -202.802736668))
            ThreePointArc((316.3, -202.802736668), (312.856636133, -194.107641068), (304.39375, -190.127565626))
            ThreePointArc((304.39375, -190.127565626), (125.8, 0), (304.39375, 190.127565626))
        make_face()
        with Locations((163.635645942, -152.664354058)):
            Circle(CONVERT_FLANGE_TO_SHEET_OUTLINE_R, mode=Mode.SUBTRACT)
        with Locations((107.756614104, -55.879031838)):
            Circle(CONVERT_FLANGE_TO_SHEET_OUTLINE_R, mode=Mode.SUBTRACT)
        with Locations((260.420968162, -208.543385896)):
            Circle(CONVERT_FLANGE_TO_SHEET_OUTLINE_R, mode=Mode.SUBTRACT)
        with Locations((107.756614104, 55.879031838)):
            Circle(CONVERT_FLANGE_TO_SHEET_OUTLINE_R, mode=Mode.SUBTRACT)
        with Locations((163.635645942, 152.664354058)):
            Circle(CONVERT_FLANGE_TO_SHEET_OUTLINE_R, mode=Mode.SUBTRACT)
        with Locations((260.420968162, 208.543385896)):
            Circle(CONVERT_FLANGE_TO_SHEET_OUTLINE_R, mode=Mode.SUBTRACT)
    extrude(amount=CONVERT_FLANGE_TO_SHEET_DEPTH)


with BuildPart() as body_5:
    # Convert Webbing to Sheet: read off the stored shape, not the designer's step
    # Convert Webbing to Sheet outline → Convert Webbing to Sheet (new body)
    with BuildSketch(Plane.YZ.offset(CONVERT_START_2)):
        with BuildLine():
            ThreePointArc((12.7, -150.9), (3.719743879, -154.619743879), (0, -163.6))
            Line((0, -163.6), (0, -461.245130056))
            ThreePointArc((0, -461.245130056), (1.56229243, -465.016837626), (5.334, -466.579130056))
            Line((5.334, -466.579130056), (309.66453199, -466.579130056))
            Line((309.66453199, -466.579130056), (316.3, -241.3))
            ThreePointArc((316.3, -241.3), (75, 0), (316.3, 241.3))
            Line((316.3, 241.3), (276.032946761, 283.456663644))
            ThreePointArc((276.032946761, 283.456663644), (270.588863094, 286.821521817), (264.195081913, 287.104151799))
            Line((264.195081913, 287.104151799), (245.952992349, 283.205693921))
            ThreePointArc((245.952992349, 283.205693921), (239.977011634, 283.367384751), (234.737080357, 286.245163347))
            Line((234.737080357, 286.245163347), (60.617668132, 445.174294781))
            ThreePointArc((60.617668132, 445.174294781), (56.482733464, 454.264990592), (60.199179654, 463.534643376))
            Line((60.199179654, 463.534643376), (73.838585609, 477.174049331))
            ThreePointArc((73.838585609, 477.174049331), (77.557495428, 486.008756787), (74.042049988, 494.926379196))
            Line((74.042049988, 494.926379196), (62.220398575, 507.302784775))
            ThreePointArc((62.220398575, 507.302784775), (53.18222674, 511.229876971), (44.056421954, 507.510967151))
            Line((44.056421954, 507.510967151), (1.562292429, 465.016837626))
            ThreePointArc((1.562292429, 465.016837626), (0.406026574, 463.286363484), (0, 461.245130056))
            Line((0, 461.245130056), (0, 163.6))
            ThreePointArc((0, 163.6), (3.719743879, 154.619743879), (12.7, 150.9))
            Line((12.7, 150.9), (50.8, 150.9))
            Line((50.8, 150.9), (50.8, 100.1))
            Line((50.8, 100.1), (12.7, 100.1))
            ThreePointArc((12.7, 100.1), (3.719743879, 96.380256121), (0, 87.4))
            Line((0, 87.4), (0, -87.4))
            ThreePointArc((0, -87.4), (3.719743879, -96.380256121), (12.7, -100.1))
            Line((12.7, -100.1), (50.8, -100.1))
            Line((50.8, -100.1), (50.8, -150.9))
            Line((50.8, -150.9), (12.7, -150.9))
        make_face()
        with BuildLine():
            Line((131.394052066, -199.403618246), (194.156373438, -259.846997017))
            ThreePointArc((194.156373438, -259.846997017), (198.032828609, -269.588102319), (193.263931773, -278.924785894))
            Line((193.263931773, -278.924785894), (71.417230327, -376.07240504))
            ThreePointArc((71.417230327, -376.07240504), (57.98904841, -377.584278062), (50.8, -366.142275939))
            Line((50.8, -366.142275939), (50.8, -176.3))
            Line((50.8, -176.3), (76.2, -176.3))
            ThreePointArc((76.2, -176.3), (105.959731151, -182.685152645), (131.394052066, -199.403618246))
        make_face(mode=Mode.SUBTRACT)
        with BuildLine():
            Line((248.00734903, -415.779130056), (139.404356101, -415.779130056))
            ThreePointArc((139.404356101, -415.779130056), (127.41680757, -407.273016107), (131.487125774, -393.149000955))
            Line((131.487125774, -393.149000955), (242.701867121, -304.478177637))
            ThreePointArc((242.701867121, -304.478177637), (256.297905781, -303.048679283), (263.313592002, -314.782215819))
            Line((263.313592002, -314.782215819), (260.701843584, -403.453039137))
            ThreePointArc((260.701843584, -403.453039137), (256.854420711, -412.190624042), (248.00734903, -415.779130056))
        make_face(mode=Mode.SUBTRACT)
        with BuildLine():
            Line((177.260013842, 252.215196046), (127.653495748, 201.052217116))
            ThreePointArc((127.653495748, 201.052217116), (104.130662555, 184.094736548), (76.2, 176.3))
            Line((76.2, 176.3), (50.8, 176.3))
            Line((50.8, 176.3), (50.8, 356.568787103))
            ThreePointArc((50.8, 356.568787103), (58.373814726, 368.18826319), (72.061767643, 365.948879577))
            Line((72.061767643, 365.948879577), (176.703906107, 270.435783335))
            ThreePointArc((176.703906107, 270.435783335), (180.836227428, 261.443125193), (177.260013842, 252.215196046))
        make_face(mode=Mode.SUBTRACT)
    extrude(amount=CONVERT_WEBBING_TO_SHEET_DEPTH)

    # Fillet2
    fillet2_edges = [body_5.edges().sort_by_distance(p)[0] for p in [
        (0, 50.8, 176.3),
        (0, 50.8, -176.3),
    ]]
    fillet(fillet2_edges, radius=FILLET2_R)


solid = Compound([body_2.part, body_4.part, body_5.part])
